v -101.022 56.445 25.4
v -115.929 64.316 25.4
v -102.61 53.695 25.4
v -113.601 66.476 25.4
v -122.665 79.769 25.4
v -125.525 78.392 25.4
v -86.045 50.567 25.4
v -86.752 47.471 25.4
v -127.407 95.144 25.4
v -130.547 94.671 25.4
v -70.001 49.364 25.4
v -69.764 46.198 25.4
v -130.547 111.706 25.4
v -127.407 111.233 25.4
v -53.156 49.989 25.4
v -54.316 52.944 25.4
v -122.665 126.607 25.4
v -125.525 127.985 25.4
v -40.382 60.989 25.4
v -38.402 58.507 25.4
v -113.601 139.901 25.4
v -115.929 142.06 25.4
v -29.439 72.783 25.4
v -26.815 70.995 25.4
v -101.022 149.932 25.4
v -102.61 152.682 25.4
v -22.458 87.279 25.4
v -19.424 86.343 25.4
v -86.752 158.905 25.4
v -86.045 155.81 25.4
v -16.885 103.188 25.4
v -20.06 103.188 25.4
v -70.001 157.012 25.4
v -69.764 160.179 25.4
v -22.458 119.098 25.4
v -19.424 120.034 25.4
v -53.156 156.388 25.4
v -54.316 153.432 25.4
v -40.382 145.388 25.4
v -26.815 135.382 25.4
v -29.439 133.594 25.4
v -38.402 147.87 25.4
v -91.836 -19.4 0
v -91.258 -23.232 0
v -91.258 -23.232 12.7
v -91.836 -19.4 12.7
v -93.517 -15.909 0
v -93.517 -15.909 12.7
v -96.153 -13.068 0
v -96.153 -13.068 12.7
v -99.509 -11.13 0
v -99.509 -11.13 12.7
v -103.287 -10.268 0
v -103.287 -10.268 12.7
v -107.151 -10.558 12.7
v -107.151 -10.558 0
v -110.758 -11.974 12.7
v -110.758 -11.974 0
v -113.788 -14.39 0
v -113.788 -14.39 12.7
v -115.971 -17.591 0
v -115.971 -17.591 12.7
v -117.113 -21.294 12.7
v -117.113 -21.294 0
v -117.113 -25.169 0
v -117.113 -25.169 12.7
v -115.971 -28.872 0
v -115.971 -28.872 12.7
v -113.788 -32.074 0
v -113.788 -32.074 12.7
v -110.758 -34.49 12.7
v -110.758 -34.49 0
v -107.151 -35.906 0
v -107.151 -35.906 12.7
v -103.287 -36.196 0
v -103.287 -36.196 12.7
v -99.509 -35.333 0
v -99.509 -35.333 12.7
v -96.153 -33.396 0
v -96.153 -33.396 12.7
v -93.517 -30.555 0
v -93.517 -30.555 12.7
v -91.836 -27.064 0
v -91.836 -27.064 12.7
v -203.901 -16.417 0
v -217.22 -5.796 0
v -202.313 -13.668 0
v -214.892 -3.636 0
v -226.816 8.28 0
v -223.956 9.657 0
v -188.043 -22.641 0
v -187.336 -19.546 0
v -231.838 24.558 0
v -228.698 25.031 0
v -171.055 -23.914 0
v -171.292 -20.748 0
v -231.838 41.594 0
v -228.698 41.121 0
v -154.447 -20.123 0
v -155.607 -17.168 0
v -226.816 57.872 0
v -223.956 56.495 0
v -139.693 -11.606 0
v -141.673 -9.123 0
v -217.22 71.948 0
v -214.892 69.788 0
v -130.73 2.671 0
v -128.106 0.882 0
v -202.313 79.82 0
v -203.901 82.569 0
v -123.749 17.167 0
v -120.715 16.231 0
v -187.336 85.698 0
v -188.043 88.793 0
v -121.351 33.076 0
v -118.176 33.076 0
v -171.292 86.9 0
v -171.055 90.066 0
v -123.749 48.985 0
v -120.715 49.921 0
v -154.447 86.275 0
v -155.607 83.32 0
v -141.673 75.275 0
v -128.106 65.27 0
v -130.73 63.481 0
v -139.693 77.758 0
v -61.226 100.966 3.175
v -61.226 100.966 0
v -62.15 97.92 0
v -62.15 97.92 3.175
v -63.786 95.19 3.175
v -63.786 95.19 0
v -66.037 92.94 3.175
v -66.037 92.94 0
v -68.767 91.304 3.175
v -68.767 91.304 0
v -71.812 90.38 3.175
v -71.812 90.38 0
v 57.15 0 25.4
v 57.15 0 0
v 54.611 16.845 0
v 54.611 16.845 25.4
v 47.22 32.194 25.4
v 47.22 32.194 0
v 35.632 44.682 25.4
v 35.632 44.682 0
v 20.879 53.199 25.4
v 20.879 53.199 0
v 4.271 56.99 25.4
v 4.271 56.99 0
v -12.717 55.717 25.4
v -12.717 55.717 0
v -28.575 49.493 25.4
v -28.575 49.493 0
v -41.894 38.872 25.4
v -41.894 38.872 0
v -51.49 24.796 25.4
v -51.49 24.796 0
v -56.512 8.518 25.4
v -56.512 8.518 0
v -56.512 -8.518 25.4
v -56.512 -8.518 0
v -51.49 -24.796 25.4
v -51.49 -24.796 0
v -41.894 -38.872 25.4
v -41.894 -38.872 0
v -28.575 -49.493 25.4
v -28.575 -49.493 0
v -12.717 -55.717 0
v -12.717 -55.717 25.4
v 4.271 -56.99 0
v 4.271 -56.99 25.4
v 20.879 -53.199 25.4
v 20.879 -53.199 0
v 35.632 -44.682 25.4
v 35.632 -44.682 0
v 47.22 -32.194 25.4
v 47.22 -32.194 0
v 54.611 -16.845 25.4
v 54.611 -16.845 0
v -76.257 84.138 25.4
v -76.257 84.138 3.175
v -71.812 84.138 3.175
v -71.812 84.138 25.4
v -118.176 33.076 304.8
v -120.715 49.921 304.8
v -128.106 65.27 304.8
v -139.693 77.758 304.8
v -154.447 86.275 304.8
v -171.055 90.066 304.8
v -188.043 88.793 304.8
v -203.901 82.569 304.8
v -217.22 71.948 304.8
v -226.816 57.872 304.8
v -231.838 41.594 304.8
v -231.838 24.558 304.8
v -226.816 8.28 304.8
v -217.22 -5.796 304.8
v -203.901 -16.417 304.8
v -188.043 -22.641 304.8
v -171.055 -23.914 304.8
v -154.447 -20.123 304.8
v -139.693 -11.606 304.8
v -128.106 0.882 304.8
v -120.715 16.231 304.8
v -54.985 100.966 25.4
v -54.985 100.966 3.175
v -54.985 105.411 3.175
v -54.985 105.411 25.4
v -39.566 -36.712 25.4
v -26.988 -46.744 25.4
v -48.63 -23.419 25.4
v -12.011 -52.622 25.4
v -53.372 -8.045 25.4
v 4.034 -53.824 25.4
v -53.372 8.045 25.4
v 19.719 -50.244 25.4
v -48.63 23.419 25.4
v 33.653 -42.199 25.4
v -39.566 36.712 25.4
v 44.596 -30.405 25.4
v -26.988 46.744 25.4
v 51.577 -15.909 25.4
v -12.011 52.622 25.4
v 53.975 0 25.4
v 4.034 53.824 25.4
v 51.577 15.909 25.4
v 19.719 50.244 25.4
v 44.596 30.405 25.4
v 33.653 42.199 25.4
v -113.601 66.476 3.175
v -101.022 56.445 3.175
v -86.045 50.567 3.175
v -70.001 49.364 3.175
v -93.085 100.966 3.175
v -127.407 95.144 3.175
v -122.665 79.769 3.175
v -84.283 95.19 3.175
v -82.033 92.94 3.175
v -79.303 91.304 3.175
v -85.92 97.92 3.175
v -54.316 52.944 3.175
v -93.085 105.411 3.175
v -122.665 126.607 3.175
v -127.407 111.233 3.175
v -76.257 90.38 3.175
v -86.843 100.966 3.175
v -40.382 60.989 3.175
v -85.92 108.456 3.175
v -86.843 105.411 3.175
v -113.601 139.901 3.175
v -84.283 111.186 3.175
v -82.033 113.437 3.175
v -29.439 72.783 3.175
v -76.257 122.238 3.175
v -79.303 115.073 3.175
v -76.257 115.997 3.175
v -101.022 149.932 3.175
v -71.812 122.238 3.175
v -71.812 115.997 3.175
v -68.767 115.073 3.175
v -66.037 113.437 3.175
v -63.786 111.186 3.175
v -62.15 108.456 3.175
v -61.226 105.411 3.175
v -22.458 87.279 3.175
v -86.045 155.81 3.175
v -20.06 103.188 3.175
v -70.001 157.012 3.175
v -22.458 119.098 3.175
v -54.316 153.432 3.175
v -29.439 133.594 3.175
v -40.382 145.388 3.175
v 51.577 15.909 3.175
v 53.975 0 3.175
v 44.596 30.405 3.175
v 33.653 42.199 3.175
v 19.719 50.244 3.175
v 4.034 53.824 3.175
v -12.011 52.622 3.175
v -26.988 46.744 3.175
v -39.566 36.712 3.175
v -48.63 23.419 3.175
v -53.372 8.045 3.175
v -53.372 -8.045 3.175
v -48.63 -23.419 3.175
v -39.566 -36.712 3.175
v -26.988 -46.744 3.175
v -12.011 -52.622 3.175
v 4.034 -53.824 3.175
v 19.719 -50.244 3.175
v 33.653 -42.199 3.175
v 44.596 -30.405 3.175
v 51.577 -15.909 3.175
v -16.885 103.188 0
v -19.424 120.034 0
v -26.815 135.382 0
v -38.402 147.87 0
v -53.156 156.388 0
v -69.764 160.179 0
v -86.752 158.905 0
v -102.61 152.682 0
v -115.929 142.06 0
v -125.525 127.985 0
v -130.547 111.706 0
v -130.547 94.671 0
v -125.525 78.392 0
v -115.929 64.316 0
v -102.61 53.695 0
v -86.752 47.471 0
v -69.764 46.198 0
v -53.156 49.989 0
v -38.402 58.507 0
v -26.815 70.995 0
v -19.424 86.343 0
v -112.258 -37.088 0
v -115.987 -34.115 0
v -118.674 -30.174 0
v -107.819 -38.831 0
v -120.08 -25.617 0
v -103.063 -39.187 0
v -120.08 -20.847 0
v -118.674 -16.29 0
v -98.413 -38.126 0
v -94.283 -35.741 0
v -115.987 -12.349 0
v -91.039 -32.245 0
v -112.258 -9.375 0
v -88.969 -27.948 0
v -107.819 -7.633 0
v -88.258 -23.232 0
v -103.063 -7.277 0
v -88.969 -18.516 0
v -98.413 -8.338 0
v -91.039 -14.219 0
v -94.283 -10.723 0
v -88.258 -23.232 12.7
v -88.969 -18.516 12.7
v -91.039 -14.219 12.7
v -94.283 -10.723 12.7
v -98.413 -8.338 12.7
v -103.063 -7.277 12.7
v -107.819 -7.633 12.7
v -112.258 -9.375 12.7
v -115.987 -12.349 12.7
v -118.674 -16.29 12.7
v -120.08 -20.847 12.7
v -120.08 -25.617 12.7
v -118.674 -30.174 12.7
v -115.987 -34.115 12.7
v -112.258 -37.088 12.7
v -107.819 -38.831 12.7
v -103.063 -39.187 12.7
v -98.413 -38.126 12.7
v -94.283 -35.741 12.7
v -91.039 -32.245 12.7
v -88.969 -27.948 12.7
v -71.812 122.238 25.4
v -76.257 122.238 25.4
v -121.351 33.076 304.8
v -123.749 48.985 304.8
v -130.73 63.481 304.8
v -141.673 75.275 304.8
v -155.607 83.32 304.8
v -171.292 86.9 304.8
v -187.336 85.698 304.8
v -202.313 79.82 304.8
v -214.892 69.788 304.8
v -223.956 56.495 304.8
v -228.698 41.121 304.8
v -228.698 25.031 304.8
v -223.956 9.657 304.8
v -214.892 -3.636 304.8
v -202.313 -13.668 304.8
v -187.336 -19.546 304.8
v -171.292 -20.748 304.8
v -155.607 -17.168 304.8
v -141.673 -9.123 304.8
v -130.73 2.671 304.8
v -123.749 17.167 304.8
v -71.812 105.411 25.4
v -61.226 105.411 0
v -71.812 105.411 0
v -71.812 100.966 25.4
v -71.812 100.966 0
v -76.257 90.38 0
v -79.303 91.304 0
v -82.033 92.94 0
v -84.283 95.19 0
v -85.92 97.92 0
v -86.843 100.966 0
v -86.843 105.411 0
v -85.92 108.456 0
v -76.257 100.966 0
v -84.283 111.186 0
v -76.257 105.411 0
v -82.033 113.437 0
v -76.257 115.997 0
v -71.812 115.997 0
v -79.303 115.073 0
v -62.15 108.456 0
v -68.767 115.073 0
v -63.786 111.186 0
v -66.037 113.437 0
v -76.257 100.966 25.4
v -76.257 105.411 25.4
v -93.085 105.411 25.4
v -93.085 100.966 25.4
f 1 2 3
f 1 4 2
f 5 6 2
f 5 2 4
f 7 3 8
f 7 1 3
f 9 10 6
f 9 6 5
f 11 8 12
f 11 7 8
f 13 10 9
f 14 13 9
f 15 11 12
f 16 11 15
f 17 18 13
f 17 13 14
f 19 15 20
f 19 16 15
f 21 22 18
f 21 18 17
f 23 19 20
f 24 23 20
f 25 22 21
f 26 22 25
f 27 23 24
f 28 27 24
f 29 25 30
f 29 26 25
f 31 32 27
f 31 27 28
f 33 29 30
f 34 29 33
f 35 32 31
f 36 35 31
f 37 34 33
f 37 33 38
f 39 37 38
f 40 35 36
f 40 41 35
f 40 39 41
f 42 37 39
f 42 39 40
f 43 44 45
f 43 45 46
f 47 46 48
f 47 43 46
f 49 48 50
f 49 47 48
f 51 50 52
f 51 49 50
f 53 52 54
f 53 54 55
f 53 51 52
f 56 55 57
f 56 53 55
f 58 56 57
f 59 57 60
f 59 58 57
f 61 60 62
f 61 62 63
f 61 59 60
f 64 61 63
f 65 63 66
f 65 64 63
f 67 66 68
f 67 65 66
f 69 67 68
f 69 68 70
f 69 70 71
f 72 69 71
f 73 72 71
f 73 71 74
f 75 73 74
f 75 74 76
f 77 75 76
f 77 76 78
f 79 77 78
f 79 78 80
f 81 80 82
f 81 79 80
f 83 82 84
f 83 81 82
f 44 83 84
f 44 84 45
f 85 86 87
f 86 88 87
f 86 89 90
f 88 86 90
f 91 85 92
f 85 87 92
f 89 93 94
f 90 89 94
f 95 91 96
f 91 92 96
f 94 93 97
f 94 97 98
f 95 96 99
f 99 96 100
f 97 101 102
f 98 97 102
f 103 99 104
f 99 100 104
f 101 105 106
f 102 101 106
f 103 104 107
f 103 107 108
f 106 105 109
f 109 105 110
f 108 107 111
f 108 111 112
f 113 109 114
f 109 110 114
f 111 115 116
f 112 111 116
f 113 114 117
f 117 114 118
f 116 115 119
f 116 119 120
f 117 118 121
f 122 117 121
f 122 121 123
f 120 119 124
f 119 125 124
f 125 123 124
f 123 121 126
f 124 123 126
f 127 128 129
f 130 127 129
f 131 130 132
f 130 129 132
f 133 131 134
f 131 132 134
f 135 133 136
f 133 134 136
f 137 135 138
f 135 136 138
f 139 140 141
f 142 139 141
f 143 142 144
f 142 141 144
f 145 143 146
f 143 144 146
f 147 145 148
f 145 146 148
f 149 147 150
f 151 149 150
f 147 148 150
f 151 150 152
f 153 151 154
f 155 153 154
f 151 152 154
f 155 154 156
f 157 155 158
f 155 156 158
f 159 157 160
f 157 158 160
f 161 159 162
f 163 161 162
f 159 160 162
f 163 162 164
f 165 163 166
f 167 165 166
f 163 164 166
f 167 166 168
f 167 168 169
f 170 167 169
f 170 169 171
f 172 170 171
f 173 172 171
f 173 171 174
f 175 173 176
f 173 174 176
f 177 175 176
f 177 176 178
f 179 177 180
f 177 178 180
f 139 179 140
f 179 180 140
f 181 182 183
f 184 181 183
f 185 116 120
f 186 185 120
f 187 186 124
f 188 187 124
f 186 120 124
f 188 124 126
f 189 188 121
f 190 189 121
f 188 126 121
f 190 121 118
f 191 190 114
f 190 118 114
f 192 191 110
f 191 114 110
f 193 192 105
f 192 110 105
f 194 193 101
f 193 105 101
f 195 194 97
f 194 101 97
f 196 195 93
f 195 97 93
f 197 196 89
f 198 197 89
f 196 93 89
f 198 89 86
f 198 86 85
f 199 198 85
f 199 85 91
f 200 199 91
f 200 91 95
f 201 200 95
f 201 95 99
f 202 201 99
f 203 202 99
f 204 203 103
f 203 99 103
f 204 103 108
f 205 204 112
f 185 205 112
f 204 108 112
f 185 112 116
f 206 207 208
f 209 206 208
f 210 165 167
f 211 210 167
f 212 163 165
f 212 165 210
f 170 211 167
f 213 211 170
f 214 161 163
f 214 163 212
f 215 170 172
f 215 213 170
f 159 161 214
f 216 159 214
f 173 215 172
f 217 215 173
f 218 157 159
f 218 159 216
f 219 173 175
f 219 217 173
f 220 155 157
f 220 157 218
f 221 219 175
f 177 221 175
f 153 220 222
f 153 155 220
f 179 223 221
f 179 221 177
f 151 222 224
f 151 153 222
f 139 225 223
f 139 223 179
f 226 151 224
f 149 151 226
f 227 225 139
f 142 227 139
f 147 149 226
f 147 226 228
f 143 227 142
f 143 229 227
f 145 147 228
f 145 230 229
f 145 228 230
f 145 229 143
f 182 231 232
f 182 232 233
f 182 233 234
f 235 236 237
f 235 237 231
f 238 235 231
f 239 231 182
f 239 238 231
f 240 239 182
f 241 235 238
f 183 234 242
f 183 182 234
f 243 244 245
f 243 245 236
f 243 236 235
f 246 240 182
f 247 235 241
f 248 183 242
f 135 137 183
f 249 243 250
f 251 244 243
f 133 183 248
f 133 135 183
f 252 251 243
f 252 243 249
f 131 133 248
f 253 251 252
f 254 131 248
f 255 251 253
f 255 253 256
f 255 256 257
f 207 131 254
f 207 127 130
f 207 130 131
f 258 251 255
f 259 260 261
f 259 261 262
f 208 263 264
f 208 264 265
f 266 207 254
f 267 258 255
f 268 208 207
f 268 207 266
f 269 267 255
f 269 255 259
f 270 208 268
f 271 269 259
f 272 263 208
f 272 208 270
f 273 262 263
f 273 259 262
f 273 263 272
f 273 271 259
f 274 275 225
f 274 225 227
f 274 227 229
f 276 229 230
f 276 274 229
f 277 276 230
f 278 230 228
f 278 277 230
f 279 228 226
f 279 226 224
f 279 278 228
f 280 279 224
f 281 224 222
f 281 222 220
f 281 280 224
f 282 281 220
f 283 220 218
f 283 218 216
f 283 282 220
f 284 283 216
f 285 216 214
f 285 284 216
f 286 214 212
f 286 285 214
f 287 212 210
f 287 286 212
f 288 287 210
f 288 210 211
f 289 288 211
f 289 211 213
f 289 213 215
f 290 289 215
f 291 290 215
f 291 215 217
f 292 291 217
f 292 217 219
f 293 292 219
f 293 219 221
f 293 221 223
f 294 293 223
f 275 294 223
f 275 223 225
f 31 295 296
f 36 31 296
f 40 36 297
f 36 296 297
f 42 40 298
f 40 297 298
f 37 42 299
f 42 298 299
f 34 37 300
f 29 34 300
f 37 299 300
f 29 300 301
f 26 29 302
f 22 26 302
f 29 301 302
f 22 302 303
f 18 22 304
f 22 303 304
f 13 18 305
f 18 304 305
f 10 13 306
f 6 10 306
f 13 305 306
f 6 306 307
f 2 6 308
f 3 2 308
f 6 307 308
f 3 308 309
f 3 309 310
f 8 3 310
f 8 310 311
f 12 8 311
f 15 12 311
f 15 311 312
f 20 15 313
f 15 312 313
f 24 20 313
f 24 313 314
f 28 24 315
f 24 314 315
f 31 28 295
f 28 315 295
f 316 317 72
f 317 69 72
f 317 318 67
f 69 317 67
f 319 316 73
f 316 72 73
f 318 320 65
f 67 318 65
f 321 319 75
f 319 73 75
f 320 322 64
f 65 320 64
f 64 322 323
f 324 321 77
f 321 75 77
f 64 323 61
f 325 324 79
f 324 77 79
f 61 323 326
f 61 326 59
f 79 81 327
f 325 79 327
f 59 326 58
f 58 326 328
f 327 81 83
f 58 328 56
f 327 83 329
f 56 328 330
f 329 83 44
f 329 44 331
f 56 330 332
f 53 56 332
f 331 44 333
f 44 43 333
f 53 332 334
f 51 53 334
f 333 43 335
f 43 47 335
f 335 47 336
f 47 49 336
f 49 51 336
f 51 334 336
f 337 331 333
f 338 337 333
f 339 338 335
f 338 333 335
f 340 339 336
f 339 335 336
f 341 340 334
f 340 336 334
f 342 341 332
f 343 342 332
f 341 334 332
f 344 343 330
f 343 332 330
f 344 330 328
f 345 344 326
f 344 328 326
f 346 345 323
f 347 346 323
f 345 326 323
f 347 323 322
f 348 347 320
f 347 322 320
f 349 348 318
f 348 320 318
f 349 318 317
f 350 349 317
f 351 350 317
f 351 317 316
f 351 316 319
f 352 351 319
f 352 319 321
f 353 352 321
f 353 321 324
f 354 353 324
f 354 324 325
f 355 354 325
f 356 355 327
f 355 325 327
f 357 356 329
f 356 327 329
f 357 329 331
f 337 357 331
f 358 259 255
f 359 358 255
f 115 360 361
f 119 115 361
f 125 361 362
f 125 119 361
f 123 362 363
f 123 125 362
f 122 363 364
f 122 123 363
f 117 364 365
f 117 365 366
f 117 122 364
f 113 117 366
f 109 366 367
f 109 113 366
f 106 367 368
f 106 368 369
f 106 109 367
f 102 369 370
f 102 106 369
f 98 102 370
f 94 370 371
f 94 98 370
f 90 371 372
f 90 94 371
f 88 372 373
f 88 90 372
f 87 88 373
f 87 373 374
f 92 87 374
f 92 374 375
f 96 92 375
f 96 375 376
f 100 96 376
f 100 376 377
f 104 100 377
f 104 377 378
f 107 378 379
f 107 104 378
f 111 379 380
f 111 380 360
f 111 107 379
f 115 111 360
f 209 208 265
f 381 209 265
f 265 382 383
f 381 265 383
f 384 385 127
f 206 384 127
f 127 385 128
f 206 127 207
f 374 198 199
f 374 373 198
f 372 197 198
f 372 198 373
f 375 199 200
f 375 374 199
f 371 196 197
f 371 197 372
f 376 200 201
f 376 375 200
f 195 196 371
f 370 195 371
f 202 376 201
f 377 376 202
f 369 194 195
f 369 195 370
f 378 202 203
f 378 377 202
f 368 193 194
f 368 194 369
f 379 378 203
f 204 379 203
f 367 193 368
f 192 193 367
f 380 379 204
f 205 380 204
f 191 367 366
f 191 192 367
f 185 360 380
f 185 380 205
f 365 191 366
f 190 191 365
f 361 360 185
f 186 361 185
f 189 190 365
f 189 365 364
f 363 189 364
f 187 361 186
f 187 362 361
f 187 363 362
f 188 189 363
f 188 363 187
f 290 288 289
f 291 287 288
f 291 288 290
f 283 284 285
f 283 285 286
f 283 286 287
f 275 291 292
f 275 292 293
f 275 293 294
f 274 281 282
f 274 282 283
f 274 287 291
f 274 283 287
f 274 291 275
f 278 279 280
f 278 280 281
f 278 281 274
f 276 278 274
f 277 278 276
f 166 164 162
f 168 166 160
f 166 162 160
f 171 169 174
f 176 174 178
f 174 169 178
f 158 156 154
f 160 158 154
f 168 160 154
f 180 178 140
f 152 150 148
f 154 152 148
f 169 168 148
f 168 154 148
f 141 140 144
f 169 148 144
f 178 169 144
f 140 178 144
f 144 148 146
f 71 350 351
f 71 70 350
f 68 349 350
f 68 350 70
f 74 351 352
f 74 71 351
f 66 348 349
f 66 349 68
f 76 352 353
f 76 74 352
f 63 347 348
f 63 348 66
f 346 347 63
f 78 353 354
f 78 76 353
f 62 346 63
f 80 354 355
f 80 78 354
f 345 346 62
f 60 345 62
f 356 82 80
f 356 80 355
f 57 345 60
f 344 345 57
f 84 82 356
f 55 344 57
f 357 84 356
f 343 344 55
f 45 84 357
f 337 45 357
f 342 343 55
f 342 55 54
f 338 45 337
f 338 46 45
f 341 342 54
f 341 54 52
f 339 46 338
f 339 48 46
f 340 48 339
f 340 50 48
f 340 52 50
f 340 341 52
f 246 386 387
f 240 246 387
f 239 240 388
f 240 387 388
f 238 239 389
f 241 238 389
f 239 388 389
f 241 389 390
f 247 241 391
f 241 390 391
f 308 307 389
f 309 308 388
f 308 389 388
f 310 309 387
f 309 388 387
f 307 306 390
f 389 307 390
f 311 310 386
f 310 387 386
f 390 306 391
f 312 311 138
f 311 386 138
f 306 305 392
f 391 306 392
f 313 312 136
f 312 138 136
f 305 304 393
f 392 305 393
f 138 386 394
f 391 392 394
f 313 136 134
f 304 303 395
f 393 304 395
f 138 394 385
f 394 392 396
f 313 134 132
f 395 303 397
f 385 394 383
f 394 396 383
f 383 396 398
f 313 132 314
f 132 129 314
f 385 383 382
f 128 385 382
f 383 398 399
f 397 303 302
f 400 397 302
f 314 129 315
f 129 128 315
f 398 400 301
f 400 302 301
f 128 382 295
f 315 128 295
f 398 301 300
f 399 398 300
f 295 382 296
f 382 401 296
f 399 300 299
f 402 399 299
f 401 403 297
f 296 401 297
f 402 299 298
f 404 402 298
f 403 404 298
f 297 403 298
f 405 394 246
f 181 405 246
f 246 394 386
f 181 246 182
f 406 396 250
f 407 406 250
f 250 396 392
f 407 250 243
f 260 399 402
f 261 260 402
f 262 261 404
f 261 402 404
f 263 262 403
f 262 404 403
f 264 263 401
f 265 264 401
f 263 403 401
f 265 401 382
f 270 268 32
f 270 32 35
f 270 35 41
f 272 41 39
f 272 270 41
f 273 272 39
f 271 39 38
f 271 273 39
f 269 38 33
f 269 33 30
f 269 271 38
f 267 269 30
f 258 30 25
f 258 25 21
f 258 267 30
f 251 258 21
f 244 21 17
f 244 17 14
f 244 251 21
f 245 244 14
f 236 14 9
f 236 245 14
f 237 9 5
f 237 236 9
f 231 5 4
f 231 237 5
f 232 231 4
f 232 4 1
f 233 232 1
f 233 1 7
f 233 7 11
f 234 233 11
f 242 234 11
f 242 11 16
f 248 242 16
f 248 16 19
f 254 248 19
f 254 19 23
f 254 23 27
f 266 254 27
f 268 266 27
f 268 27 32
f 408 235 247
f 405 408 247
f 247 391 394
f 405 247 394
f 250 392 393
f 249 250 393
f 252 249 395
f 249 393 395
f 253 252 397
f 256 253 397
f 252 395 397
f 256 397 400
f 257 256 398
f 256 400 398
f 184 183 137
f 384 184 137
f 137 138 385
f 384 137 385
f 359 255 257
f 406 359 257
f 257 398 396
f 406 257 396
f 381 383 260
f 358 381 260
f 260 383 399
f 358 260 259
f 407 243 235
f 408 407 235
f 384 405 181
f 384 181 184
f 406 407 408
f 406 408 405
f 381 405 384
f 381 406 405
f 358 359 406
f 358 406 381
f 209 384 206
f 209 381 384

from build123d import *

# Parameters (mm, degrees)
F0_R     = 53.975
F1_DEPTH = 3.175
F0_R_2   = 57.15
F2_DEPTH = 25.4
F0_W     = 4.445
F0_H     = 4.445
F3_DEPTH = 304.8
F4_R     = 16
F4_R_2   = 13
F5_DEPTH = 12.7


with BuildPart() as f1:
    # F0 (on Top) → F1 (new body)
    with BuildSketch(Plane.XY):
        with Locations((-74.0348821748, 103.1883531284)):
            Circle(F0_R)
        with BuildLine():
            ThreePointArc((-71.8123821748, 115.9969632697), (-64.8424940194, 112.3807412839), (-61.2262720336, 105.4108531284))
            Line((-61.2262720336, 105.4108531284), (-54.9848821748, 105.4108531284))
            Line((-54.9848821748, 105.4108531284), (-54.9848821748, 100.9658531284))
            Line((-54.9848821748, 100.9658531284), (-61.2262720336, 100.9658531284))
            ThreePointArc((-61.2262720336, 100.9658531284), (-64.8424940194, 93.995964973), (-71.8123821748, 90.3797429872))
            Line((-71.8123821748, 90.3797429872), (-71.8123821748, 84.1383531284))
            Line((-71.8123821748, 84.1383531284), (-76.2573821748, 84.1383531284))
            Line((-76.2573821748, 84.1383531284), (-76.2573821748, 90.3797429872))
            ThreePointArc((-76.2573821748, 90.3797429872), (-83.2272703302, 93.995964973), (-86.843492316, 100.9658531284))
            Line((-86.843492316, 100.9658531284), (-93.0848821748, 100.9658531284))
            Line((-93.0848821748, 100.9658531284), (-93.0848821748, 105.4108531284))
            Line((-93.0848821748, 105.4108531284), (-86.843492316, 105.4108531284))
            ThreePointArc((-86.843492316, 105.4108531284), (-83.2272703302, 112.3807412839), (-76.2573821748, 115.9969632697))
            Line((-76.2573821748, 115.9969632697), (-76.2573821748, 122.2383531284))
            Line((-76.2573821748, 122.2383531284), (-71.8123821748, 122.2383531284))
            Line((-71.8123821748, 122.2383531284), (-71.8123821748, 115.9969632697))
        make_face(mode=Mode.SUBTRACT)
    extrude(amount=F1_DEPTH)

    # F0 (on Top) → F2, piece 2 (join)
    with BuildSketch(Plane.XY):
        with Locations((-74.0348821748, 103.1883531284)):
            Circle(F0_R_2)
        with Locations((-74.0348821748, 103.1883531284)):
            Circle(F0_R, mode=Mode.SUBTRACT)
        with BuildLine():
            ThreePointArc((-76.2573821748, 90.3797429872), (-74.0348821748, 90.1883531284), (-71.8123821748, 90.3797429872))
            Line((-71.8123821748, 90.3797429872), (-71.8123821748, 100.9658531284))
            Line((-71.8123821748, 100.9658531284), (-76.2573821748, 100.9658531284))
            Line((-76.2573821748, 100.9658531284), (-76.2573821748, 90.3797429872))
        make_face()
        with BuildLine():
            Line((-71.8123821748, 105.4108531284), (-71.8123821748, 115.9969632697))
            ThreePointArc((-71.8123821748, 115.9969632697), (-74.0348821748, 116.1883531284), (-76.2573821748, 115.9969632697))
            Line((-76.2573821748, 115.9969632697), (-76.2573821748, 105.4108531284))
            Line((-76.2573821748, 105.4108531284), (-71.8123821748, 105.4108531284))
        make_face()
        with BuildLine():
            ThreePointArc((-61.2262720336, 100.9658531284), (-61.0828180182, 102.0729903704), (-61.0348821748, 103.1883531284))
            ThreePointArc((-61.0348821748, 103.1883531284), (-61.0828180182, 104.3037158865), (-61.2262720336, 105.4108531284))
            Line((-61.2262720336, 105.4108531284), (-71.8123821748, 105.4108531284))
            Line((-71.8123821748, 105.4108531284), (-71.8123821748, 100.9658531284))
            Line((-71.8123821748, 100.9658531284), (-61.2262720336, 100.9658531284))
        make_face()
        with BuildLine():
            Line((-76.2573821748, 100.9658531284), (-76.2573821748, 105.4108531284))
            Line((-76.2573821748, 105.4108531284), (-86.843492316, 105.4108531284))
            ThreePointArc((-86.843492316, 105.4108531284), (-87.0348821748, 103.1883531284), (-86.843492316, 100.9658531284))
            Line((-86.843492316, 100.9658531284), (-76.2573821748, 100.9658531284))
        make_face()
        with BuildLine():
            Line((-71.8123821748, 84.1383531284), (-71.8123821748, 90.3797429872))
            ThreePointArc((-71.8123821748, 90.3797429872), (-74.0348821748, 90.1883531284), (-76.2573821748, 90.3797429872))
            Line((-76.2573821748, 90.3797429872), (-76.2573821748, 84.1383531284))
            Line((-76.2573821748, 84.1383531284), (-71.8123821748, 84.1383531284))
        make_face()
        with BuildLine():
            ThreePointArc((-76.2573821748, 115.9969632697), (-74.0348821748, 116.1883531284), (-71.8123821748, 115.9969632697))
            Line((-71.8123821748, 115.9969632697), (-71.8123821748, 122.2383531284))
            Line((-71.8123821748, 122.2383531284), (-76.2573821748, 122.2383531284))
            Line((-76.2573821748, 122.2383531284), (-76.2573821748, 115.9969632697))
        make_face()
        with BuildLine():
            ThreePointArc((-61.2262720336, 105.4108531284), (-61.0828180182, 104.3037158865), (-61.0348821748, 103.1883531284))
            ThreePointArc((-61.0348821748, 103.1883531284), (-61.0828180182, 102.0729903704), (-61.2262720336, 100.9658531284))
            Line((-61.2262720336, 100.9658531284), (-54.9848821748, 100.9658531284))
            Line((-54.9848821748, 100.9658531284), (-54.9848821748, 105.4108531284))
            Line((-54.9848821748, 105.4108531284), (-61.2262720336, 105.4108531284))
        make_face()
        with BuildLine():
            ThreePointArc((-86.843492316, 100.9658531284), (-87.0348821748, 103.1883531284), (-86.843492316, 105.4108531284))
            Line((-86.843492316, 105.4108531284), (-93.0848821748, 105.4108531284))
            Line((-93.0848821748, 105.4108531284), (-93.0848821748, 100.9658531284))
            Line((-93.0848821748, 100.9658531284), (-86.843492316, 100.9658531284))
        make_face()
        with Locations((-74.0348821748, 103.1883531284)):
            Rectangle(F0_W, F0_H)
    extrude(amount=F2_DEPTH)


with BuildPart() as f1b:
    # F0 (on Top) → F1, piece 2 (new body)
    with BuildSketch(Plane.XY):
        Circle(F0_R)
    extrude(amount=F1_DEPTH)

    # F0 (on Top) → F2 (join)
    with BuildSketch(Plane.XY):
        Circle(F0_R_2)
        Circle(F0_R, mode=Mode.SUBTRACT)
    extrude(amount=F2_DEPTH)


with BuildPart() as f3:
    # F0 (on Top) → F3 (new body)
    with BuildSketch(Plane.XY):
        with Locations((-175.3259235067, 33.0760006827)):
            Circle(F0_R_2)
        with Locations((-175.3259235067, 33.0760006827)):
            Circle(F0_R, mode=Mode.SUBTRACT)
    extrude(amount=F3_DEPTH)


with BuildPart() as f5:
    # F4 (on Top) → F5 (new body)
    with BuildSketch(Plane.XY):
        with Locations((-104.2583733797, -23.2318546623)):
            Circle(F4_R)
        with Locations((-104.2583733797, -23.2318546623)):
            Circle(F4_R_2, mode=Mode.SUBTRACT)
    extrude(amount=F5_DEPTH)


solid = Compound([f1.part, f1b.part, f3.part, f5.part])
